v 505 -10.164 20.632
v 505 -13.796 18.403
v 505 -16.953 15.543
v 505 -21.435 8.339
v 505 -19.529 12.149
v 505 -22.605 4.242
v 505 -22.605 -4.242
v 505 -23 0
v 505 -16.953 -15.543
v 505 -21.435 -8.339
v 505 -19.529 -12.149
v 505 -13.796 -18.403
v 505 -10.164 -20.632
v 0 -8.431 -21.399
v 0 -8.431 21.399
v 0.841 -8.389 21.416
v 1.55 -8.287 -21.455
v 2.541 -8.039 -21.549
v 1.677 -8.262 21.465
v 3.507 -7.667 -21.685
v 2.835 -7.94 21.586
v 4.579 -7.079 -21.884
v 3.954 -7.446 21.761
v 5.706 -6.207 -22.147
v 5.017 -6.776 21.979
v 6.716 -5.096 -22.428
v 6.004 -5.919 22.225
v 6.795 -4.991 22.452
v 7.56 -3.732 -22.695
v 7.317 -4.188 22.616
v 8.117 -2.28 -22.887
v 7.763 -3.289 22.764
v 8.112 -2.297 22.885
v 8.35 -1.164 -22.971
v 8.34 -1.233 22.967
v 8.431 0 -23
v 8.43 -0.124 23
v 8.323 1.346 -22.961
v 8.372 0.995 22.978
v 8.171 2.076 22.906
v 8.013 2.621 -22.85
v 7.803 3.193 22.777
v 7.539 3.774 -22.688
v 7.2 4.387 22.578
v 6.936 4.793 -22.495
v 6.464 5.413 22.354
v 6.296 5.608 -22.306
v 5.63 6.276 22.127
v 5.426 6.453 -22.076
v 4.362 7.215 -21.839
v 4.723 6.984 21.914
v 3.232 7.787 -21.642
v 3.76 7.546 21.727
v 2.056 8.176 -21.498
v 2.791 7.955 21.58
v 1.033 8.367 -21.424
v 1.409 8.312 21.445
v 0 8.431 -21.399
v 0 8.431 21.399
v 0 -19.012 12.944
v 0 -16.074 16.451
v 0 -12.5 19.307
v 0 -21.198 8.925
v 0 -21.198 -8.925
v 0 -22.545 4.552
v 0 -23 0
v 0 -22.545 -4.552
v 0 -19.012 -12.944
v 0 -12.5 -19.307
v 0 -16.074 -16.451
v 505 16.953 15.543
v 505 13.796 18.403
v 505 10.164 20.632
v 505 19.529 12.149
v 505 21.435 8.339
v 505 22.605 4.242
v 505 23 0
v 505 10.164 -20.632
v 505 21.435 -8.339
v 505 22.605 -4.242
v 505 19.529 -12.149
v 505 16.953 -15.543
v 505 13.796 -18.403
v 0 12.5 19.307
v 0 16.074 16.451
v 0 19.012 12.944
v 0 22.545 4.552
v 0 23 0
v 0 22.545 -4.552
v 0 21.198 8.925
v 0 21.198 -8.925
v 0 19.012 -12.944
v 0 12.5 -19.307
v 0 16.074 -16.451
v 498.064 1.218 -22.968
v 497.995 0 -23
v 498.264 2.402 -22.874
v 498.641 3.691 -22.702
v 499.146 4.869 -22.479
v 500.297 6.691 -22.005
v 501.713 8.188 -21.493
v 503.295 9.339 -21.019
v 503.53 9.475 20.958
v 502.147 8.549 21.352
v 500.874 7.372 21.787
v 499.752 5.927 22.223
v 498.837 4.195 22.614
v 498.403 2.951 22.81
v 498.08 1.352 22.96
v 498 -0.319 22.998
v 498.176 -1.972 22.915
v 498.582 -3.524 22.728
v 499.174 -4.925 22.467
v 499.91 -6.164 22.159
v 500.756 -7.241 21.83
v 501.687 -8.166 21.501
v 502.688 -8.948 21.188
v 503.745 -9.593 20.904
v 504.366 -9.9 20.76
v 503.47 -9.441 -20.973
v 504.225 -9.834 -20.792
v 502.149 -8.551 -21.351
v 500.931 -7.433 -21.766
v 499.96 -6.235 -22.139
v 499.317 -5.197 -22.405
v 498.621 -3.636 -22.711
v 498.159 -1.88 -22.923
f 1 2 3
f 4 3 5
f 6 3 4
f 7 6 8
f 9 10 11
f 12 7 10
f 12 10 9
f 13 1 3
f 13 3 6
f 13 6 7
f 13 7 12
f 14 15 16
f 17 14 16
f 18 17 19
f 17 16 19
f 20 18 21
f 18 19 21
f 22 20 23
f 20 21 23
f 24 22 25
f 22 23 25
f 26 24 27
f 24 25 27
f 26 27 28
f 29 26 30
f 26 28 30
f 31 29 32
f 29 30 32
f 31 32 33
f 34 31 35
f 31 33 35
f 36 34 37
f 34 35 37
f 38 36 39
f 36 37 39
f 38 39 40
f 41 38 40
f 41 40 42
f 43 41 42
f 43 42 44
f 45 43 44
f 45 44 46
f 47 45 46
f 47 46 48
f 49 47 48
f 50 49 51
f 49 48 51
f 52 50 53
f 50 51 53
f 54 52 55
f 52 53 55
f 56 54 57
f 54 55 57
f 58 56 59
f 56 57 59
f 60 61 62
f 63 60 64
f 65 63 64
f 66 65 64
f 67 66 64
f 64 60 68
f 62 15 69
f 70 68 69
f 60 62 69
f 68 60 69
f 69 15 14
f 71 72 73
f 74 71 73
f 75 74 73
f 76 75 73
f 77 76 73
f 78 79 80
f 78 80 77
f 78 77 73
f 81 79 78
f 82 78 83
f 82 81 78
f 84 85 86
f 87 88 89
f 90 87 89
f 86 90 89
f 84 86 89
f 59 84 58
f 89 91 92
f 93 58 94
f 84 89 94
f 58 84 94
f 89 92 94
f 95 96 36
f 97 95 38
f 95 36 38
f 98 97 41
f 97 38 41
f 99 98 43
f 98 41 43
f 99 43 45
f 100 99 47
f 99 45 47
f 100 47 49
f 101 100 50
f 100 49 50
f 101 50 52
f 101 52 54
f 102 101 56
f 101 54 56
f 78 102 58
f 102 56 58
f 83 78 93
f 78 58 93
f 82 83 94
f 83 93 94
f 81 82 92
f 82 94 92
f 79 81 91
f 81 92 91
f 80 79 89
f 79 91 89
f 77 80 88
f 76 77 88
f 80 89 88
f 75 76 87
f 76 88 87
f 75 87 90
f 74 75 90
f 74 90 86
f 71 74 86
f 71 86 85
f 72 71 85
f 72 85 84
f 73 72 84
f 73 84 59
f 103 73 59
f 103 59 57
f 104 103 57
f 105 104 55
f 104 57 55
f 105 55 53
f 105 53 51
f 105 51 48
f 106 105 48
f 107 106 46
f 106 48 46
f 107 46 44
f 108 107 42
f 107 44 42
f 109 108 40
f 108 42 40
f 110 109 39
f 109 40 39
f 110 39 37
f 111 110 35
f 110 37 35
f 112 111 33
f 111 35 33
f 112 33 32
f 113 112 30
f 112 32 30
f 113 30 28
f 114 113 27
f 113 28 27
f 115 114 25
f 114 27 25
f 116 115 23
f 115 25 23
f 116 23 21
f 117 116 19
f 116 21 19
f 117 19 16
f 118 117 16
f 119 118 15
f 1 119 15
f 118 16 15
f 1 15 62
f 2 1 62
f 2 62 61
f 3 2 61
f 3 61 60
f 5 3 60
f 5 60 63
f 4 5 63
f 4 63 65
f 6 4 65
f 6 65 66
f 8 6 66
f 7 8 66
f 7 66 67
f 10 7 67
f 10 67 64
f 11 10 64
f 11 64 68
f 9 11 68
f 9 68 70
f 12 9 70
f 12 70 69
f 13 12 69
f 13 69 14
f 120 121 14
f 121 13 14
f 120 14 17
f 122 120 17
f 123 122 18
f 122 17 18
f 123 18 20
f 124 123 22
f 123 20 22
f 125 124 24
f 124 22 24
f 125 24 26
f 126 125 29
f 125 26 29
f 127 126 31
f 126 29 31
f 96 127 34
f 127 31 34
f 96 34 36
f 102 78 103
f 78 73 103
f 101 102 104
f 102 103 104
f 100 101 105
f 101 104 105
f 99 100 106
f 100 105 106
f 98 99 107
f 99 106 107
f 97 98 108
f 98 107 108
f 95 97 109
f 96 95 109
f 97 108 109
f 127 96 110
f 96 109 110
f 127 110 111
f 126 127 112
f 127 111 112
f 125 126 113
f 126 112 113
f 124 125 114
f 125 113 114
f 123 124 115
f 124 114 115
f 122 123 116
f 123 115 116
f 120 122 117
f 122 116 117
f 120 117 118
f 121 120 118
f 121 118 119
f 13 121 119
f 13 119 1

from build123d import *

# Parameters (mm, degrees)
SKETCH1_R                         = 23
LENGTH_DEPTH                      = 505
FEMUR_HOLE_REACH                  = 508.046
FEMUR_HOLE_END_RADIUS             = 23
SKETCH2_R                         = 8.430886207
SKETCH2_R_2                       = 10.877092796
FEMUR_HOLE_DIRECTION_2_REACH      = 508.046
FEMUR_HOLE_DIRECTION_2_END_RADIUS = 23


with BuildPart() as part:
    # Sketch1 → Length (new body)
    with BuildSketch(Plane(origin=(0, 0, 0), x_dir=(0, 0, -1), z_dir=(1, 0, 0))):
        Circle(SKETCH1_R)
    extrude(amount=LENGTH_DEPTH)

    # Femur hole: up to this cylinder (the profile starts inside it)
    femur_hole_end = Plane(origin=(254.436174, 0, 0), z_dir=(-1, 0, 0)) * Cylinder(FEMUR_HOLE_END_RADIUS, 1571.964348, mode=Mode.PRIVATE)
    # Sketch2 → Femur hole (cut, up to the surface)
    with BuildSketch(Plane.XY, mode=Mode.PRIVATE) as femur_hole_sk1:
        Circle(SKETCH2_R)
    femur_hole_tool1 = extrude(femur_hole_sk1.sketch, amount=-FEMUR_HOLE_REACH, mode=Mode.PRIVATE) & femur_hole_end
    add(femur_hole_tool1.solids().sort_by_distance((0, 0, 0))[0], mode=Mode.SUBTRACT)
    # Sketch2 → Femur hole (cut, up to the surface)
    with BuildSketch(Plane.XY, mode=Mode.PRIVATE) as femur_hole_sk2:
        with Locations((508.872347898, 0)):
            Circle(SKETCH2_R_2)
    femur_hole_tool2 = extrude(femur_hole_sk2.sketch, amount=-FEMUR_HOLE_REACH, mode=Mode.PRIVATE) & femur_hole_end
    add(femur_hole_tool2.solids().sort_by_distance((508.872348, 0, 0))[0], mode=Mode.SUBTRACT)

    # Femur hole direction 2: up to this cylinder (the profile starts inside it)
    femur_hole_direction_2_end = Plane(origin=(254.436174, 0, 0), z_dir=(-1, 0, 0)) * Cylinder(FEMUR_HOLE_DIRECTION_2_END_RADIUS, 1571.964348, mode=Mode.PRIVATE)
    # Sketch2 → Femur hole direction 2 (cut, up to the surface)
    with BuildSketch(Plane.XY, mode=Mode.PRIVATE) as femur_hole_direction_2_sk1:
        Circle(SKETCH2_R)
    femur_hole_direction_2_tool1 = extrude(femur_hole_direction_2_sk1.sketch, amount=FEMUR_HOLE_DIRECTION_2_REACH, mode=Mode.PRIVATE) & femur_hole_direction_2_end
    add(femur_hole_direction_2_tool1.solids().sort_by_distance((0, 0, 0))[0], mode=Mode.SUBTRACT)
    # Sketch2 → Femur hole direction 2 (cut, up to the surface)
    with BuildSketch(Plane.XY, mode=Mode.PRIVATE) as femur_hole_direction_2_sk2:
        with Locations((508.872347898, 0)):
            Circle(SKETCH2_R_2)
    femur_hole_direction_2_tool2 = extrude(femur_hole_direction_2_sk2.sketch, amount=FEMUR_HOLE_DIRECTION_2_REACH, mode=Mode.PRIVATE) & femur_hole_direction_2_end
    add(femur_hole_direction_2_tool2.solids().sort_by_distance((508.872348, 0, 0))[0], mode=Mode.SUBTRACT)


solid = part.part
